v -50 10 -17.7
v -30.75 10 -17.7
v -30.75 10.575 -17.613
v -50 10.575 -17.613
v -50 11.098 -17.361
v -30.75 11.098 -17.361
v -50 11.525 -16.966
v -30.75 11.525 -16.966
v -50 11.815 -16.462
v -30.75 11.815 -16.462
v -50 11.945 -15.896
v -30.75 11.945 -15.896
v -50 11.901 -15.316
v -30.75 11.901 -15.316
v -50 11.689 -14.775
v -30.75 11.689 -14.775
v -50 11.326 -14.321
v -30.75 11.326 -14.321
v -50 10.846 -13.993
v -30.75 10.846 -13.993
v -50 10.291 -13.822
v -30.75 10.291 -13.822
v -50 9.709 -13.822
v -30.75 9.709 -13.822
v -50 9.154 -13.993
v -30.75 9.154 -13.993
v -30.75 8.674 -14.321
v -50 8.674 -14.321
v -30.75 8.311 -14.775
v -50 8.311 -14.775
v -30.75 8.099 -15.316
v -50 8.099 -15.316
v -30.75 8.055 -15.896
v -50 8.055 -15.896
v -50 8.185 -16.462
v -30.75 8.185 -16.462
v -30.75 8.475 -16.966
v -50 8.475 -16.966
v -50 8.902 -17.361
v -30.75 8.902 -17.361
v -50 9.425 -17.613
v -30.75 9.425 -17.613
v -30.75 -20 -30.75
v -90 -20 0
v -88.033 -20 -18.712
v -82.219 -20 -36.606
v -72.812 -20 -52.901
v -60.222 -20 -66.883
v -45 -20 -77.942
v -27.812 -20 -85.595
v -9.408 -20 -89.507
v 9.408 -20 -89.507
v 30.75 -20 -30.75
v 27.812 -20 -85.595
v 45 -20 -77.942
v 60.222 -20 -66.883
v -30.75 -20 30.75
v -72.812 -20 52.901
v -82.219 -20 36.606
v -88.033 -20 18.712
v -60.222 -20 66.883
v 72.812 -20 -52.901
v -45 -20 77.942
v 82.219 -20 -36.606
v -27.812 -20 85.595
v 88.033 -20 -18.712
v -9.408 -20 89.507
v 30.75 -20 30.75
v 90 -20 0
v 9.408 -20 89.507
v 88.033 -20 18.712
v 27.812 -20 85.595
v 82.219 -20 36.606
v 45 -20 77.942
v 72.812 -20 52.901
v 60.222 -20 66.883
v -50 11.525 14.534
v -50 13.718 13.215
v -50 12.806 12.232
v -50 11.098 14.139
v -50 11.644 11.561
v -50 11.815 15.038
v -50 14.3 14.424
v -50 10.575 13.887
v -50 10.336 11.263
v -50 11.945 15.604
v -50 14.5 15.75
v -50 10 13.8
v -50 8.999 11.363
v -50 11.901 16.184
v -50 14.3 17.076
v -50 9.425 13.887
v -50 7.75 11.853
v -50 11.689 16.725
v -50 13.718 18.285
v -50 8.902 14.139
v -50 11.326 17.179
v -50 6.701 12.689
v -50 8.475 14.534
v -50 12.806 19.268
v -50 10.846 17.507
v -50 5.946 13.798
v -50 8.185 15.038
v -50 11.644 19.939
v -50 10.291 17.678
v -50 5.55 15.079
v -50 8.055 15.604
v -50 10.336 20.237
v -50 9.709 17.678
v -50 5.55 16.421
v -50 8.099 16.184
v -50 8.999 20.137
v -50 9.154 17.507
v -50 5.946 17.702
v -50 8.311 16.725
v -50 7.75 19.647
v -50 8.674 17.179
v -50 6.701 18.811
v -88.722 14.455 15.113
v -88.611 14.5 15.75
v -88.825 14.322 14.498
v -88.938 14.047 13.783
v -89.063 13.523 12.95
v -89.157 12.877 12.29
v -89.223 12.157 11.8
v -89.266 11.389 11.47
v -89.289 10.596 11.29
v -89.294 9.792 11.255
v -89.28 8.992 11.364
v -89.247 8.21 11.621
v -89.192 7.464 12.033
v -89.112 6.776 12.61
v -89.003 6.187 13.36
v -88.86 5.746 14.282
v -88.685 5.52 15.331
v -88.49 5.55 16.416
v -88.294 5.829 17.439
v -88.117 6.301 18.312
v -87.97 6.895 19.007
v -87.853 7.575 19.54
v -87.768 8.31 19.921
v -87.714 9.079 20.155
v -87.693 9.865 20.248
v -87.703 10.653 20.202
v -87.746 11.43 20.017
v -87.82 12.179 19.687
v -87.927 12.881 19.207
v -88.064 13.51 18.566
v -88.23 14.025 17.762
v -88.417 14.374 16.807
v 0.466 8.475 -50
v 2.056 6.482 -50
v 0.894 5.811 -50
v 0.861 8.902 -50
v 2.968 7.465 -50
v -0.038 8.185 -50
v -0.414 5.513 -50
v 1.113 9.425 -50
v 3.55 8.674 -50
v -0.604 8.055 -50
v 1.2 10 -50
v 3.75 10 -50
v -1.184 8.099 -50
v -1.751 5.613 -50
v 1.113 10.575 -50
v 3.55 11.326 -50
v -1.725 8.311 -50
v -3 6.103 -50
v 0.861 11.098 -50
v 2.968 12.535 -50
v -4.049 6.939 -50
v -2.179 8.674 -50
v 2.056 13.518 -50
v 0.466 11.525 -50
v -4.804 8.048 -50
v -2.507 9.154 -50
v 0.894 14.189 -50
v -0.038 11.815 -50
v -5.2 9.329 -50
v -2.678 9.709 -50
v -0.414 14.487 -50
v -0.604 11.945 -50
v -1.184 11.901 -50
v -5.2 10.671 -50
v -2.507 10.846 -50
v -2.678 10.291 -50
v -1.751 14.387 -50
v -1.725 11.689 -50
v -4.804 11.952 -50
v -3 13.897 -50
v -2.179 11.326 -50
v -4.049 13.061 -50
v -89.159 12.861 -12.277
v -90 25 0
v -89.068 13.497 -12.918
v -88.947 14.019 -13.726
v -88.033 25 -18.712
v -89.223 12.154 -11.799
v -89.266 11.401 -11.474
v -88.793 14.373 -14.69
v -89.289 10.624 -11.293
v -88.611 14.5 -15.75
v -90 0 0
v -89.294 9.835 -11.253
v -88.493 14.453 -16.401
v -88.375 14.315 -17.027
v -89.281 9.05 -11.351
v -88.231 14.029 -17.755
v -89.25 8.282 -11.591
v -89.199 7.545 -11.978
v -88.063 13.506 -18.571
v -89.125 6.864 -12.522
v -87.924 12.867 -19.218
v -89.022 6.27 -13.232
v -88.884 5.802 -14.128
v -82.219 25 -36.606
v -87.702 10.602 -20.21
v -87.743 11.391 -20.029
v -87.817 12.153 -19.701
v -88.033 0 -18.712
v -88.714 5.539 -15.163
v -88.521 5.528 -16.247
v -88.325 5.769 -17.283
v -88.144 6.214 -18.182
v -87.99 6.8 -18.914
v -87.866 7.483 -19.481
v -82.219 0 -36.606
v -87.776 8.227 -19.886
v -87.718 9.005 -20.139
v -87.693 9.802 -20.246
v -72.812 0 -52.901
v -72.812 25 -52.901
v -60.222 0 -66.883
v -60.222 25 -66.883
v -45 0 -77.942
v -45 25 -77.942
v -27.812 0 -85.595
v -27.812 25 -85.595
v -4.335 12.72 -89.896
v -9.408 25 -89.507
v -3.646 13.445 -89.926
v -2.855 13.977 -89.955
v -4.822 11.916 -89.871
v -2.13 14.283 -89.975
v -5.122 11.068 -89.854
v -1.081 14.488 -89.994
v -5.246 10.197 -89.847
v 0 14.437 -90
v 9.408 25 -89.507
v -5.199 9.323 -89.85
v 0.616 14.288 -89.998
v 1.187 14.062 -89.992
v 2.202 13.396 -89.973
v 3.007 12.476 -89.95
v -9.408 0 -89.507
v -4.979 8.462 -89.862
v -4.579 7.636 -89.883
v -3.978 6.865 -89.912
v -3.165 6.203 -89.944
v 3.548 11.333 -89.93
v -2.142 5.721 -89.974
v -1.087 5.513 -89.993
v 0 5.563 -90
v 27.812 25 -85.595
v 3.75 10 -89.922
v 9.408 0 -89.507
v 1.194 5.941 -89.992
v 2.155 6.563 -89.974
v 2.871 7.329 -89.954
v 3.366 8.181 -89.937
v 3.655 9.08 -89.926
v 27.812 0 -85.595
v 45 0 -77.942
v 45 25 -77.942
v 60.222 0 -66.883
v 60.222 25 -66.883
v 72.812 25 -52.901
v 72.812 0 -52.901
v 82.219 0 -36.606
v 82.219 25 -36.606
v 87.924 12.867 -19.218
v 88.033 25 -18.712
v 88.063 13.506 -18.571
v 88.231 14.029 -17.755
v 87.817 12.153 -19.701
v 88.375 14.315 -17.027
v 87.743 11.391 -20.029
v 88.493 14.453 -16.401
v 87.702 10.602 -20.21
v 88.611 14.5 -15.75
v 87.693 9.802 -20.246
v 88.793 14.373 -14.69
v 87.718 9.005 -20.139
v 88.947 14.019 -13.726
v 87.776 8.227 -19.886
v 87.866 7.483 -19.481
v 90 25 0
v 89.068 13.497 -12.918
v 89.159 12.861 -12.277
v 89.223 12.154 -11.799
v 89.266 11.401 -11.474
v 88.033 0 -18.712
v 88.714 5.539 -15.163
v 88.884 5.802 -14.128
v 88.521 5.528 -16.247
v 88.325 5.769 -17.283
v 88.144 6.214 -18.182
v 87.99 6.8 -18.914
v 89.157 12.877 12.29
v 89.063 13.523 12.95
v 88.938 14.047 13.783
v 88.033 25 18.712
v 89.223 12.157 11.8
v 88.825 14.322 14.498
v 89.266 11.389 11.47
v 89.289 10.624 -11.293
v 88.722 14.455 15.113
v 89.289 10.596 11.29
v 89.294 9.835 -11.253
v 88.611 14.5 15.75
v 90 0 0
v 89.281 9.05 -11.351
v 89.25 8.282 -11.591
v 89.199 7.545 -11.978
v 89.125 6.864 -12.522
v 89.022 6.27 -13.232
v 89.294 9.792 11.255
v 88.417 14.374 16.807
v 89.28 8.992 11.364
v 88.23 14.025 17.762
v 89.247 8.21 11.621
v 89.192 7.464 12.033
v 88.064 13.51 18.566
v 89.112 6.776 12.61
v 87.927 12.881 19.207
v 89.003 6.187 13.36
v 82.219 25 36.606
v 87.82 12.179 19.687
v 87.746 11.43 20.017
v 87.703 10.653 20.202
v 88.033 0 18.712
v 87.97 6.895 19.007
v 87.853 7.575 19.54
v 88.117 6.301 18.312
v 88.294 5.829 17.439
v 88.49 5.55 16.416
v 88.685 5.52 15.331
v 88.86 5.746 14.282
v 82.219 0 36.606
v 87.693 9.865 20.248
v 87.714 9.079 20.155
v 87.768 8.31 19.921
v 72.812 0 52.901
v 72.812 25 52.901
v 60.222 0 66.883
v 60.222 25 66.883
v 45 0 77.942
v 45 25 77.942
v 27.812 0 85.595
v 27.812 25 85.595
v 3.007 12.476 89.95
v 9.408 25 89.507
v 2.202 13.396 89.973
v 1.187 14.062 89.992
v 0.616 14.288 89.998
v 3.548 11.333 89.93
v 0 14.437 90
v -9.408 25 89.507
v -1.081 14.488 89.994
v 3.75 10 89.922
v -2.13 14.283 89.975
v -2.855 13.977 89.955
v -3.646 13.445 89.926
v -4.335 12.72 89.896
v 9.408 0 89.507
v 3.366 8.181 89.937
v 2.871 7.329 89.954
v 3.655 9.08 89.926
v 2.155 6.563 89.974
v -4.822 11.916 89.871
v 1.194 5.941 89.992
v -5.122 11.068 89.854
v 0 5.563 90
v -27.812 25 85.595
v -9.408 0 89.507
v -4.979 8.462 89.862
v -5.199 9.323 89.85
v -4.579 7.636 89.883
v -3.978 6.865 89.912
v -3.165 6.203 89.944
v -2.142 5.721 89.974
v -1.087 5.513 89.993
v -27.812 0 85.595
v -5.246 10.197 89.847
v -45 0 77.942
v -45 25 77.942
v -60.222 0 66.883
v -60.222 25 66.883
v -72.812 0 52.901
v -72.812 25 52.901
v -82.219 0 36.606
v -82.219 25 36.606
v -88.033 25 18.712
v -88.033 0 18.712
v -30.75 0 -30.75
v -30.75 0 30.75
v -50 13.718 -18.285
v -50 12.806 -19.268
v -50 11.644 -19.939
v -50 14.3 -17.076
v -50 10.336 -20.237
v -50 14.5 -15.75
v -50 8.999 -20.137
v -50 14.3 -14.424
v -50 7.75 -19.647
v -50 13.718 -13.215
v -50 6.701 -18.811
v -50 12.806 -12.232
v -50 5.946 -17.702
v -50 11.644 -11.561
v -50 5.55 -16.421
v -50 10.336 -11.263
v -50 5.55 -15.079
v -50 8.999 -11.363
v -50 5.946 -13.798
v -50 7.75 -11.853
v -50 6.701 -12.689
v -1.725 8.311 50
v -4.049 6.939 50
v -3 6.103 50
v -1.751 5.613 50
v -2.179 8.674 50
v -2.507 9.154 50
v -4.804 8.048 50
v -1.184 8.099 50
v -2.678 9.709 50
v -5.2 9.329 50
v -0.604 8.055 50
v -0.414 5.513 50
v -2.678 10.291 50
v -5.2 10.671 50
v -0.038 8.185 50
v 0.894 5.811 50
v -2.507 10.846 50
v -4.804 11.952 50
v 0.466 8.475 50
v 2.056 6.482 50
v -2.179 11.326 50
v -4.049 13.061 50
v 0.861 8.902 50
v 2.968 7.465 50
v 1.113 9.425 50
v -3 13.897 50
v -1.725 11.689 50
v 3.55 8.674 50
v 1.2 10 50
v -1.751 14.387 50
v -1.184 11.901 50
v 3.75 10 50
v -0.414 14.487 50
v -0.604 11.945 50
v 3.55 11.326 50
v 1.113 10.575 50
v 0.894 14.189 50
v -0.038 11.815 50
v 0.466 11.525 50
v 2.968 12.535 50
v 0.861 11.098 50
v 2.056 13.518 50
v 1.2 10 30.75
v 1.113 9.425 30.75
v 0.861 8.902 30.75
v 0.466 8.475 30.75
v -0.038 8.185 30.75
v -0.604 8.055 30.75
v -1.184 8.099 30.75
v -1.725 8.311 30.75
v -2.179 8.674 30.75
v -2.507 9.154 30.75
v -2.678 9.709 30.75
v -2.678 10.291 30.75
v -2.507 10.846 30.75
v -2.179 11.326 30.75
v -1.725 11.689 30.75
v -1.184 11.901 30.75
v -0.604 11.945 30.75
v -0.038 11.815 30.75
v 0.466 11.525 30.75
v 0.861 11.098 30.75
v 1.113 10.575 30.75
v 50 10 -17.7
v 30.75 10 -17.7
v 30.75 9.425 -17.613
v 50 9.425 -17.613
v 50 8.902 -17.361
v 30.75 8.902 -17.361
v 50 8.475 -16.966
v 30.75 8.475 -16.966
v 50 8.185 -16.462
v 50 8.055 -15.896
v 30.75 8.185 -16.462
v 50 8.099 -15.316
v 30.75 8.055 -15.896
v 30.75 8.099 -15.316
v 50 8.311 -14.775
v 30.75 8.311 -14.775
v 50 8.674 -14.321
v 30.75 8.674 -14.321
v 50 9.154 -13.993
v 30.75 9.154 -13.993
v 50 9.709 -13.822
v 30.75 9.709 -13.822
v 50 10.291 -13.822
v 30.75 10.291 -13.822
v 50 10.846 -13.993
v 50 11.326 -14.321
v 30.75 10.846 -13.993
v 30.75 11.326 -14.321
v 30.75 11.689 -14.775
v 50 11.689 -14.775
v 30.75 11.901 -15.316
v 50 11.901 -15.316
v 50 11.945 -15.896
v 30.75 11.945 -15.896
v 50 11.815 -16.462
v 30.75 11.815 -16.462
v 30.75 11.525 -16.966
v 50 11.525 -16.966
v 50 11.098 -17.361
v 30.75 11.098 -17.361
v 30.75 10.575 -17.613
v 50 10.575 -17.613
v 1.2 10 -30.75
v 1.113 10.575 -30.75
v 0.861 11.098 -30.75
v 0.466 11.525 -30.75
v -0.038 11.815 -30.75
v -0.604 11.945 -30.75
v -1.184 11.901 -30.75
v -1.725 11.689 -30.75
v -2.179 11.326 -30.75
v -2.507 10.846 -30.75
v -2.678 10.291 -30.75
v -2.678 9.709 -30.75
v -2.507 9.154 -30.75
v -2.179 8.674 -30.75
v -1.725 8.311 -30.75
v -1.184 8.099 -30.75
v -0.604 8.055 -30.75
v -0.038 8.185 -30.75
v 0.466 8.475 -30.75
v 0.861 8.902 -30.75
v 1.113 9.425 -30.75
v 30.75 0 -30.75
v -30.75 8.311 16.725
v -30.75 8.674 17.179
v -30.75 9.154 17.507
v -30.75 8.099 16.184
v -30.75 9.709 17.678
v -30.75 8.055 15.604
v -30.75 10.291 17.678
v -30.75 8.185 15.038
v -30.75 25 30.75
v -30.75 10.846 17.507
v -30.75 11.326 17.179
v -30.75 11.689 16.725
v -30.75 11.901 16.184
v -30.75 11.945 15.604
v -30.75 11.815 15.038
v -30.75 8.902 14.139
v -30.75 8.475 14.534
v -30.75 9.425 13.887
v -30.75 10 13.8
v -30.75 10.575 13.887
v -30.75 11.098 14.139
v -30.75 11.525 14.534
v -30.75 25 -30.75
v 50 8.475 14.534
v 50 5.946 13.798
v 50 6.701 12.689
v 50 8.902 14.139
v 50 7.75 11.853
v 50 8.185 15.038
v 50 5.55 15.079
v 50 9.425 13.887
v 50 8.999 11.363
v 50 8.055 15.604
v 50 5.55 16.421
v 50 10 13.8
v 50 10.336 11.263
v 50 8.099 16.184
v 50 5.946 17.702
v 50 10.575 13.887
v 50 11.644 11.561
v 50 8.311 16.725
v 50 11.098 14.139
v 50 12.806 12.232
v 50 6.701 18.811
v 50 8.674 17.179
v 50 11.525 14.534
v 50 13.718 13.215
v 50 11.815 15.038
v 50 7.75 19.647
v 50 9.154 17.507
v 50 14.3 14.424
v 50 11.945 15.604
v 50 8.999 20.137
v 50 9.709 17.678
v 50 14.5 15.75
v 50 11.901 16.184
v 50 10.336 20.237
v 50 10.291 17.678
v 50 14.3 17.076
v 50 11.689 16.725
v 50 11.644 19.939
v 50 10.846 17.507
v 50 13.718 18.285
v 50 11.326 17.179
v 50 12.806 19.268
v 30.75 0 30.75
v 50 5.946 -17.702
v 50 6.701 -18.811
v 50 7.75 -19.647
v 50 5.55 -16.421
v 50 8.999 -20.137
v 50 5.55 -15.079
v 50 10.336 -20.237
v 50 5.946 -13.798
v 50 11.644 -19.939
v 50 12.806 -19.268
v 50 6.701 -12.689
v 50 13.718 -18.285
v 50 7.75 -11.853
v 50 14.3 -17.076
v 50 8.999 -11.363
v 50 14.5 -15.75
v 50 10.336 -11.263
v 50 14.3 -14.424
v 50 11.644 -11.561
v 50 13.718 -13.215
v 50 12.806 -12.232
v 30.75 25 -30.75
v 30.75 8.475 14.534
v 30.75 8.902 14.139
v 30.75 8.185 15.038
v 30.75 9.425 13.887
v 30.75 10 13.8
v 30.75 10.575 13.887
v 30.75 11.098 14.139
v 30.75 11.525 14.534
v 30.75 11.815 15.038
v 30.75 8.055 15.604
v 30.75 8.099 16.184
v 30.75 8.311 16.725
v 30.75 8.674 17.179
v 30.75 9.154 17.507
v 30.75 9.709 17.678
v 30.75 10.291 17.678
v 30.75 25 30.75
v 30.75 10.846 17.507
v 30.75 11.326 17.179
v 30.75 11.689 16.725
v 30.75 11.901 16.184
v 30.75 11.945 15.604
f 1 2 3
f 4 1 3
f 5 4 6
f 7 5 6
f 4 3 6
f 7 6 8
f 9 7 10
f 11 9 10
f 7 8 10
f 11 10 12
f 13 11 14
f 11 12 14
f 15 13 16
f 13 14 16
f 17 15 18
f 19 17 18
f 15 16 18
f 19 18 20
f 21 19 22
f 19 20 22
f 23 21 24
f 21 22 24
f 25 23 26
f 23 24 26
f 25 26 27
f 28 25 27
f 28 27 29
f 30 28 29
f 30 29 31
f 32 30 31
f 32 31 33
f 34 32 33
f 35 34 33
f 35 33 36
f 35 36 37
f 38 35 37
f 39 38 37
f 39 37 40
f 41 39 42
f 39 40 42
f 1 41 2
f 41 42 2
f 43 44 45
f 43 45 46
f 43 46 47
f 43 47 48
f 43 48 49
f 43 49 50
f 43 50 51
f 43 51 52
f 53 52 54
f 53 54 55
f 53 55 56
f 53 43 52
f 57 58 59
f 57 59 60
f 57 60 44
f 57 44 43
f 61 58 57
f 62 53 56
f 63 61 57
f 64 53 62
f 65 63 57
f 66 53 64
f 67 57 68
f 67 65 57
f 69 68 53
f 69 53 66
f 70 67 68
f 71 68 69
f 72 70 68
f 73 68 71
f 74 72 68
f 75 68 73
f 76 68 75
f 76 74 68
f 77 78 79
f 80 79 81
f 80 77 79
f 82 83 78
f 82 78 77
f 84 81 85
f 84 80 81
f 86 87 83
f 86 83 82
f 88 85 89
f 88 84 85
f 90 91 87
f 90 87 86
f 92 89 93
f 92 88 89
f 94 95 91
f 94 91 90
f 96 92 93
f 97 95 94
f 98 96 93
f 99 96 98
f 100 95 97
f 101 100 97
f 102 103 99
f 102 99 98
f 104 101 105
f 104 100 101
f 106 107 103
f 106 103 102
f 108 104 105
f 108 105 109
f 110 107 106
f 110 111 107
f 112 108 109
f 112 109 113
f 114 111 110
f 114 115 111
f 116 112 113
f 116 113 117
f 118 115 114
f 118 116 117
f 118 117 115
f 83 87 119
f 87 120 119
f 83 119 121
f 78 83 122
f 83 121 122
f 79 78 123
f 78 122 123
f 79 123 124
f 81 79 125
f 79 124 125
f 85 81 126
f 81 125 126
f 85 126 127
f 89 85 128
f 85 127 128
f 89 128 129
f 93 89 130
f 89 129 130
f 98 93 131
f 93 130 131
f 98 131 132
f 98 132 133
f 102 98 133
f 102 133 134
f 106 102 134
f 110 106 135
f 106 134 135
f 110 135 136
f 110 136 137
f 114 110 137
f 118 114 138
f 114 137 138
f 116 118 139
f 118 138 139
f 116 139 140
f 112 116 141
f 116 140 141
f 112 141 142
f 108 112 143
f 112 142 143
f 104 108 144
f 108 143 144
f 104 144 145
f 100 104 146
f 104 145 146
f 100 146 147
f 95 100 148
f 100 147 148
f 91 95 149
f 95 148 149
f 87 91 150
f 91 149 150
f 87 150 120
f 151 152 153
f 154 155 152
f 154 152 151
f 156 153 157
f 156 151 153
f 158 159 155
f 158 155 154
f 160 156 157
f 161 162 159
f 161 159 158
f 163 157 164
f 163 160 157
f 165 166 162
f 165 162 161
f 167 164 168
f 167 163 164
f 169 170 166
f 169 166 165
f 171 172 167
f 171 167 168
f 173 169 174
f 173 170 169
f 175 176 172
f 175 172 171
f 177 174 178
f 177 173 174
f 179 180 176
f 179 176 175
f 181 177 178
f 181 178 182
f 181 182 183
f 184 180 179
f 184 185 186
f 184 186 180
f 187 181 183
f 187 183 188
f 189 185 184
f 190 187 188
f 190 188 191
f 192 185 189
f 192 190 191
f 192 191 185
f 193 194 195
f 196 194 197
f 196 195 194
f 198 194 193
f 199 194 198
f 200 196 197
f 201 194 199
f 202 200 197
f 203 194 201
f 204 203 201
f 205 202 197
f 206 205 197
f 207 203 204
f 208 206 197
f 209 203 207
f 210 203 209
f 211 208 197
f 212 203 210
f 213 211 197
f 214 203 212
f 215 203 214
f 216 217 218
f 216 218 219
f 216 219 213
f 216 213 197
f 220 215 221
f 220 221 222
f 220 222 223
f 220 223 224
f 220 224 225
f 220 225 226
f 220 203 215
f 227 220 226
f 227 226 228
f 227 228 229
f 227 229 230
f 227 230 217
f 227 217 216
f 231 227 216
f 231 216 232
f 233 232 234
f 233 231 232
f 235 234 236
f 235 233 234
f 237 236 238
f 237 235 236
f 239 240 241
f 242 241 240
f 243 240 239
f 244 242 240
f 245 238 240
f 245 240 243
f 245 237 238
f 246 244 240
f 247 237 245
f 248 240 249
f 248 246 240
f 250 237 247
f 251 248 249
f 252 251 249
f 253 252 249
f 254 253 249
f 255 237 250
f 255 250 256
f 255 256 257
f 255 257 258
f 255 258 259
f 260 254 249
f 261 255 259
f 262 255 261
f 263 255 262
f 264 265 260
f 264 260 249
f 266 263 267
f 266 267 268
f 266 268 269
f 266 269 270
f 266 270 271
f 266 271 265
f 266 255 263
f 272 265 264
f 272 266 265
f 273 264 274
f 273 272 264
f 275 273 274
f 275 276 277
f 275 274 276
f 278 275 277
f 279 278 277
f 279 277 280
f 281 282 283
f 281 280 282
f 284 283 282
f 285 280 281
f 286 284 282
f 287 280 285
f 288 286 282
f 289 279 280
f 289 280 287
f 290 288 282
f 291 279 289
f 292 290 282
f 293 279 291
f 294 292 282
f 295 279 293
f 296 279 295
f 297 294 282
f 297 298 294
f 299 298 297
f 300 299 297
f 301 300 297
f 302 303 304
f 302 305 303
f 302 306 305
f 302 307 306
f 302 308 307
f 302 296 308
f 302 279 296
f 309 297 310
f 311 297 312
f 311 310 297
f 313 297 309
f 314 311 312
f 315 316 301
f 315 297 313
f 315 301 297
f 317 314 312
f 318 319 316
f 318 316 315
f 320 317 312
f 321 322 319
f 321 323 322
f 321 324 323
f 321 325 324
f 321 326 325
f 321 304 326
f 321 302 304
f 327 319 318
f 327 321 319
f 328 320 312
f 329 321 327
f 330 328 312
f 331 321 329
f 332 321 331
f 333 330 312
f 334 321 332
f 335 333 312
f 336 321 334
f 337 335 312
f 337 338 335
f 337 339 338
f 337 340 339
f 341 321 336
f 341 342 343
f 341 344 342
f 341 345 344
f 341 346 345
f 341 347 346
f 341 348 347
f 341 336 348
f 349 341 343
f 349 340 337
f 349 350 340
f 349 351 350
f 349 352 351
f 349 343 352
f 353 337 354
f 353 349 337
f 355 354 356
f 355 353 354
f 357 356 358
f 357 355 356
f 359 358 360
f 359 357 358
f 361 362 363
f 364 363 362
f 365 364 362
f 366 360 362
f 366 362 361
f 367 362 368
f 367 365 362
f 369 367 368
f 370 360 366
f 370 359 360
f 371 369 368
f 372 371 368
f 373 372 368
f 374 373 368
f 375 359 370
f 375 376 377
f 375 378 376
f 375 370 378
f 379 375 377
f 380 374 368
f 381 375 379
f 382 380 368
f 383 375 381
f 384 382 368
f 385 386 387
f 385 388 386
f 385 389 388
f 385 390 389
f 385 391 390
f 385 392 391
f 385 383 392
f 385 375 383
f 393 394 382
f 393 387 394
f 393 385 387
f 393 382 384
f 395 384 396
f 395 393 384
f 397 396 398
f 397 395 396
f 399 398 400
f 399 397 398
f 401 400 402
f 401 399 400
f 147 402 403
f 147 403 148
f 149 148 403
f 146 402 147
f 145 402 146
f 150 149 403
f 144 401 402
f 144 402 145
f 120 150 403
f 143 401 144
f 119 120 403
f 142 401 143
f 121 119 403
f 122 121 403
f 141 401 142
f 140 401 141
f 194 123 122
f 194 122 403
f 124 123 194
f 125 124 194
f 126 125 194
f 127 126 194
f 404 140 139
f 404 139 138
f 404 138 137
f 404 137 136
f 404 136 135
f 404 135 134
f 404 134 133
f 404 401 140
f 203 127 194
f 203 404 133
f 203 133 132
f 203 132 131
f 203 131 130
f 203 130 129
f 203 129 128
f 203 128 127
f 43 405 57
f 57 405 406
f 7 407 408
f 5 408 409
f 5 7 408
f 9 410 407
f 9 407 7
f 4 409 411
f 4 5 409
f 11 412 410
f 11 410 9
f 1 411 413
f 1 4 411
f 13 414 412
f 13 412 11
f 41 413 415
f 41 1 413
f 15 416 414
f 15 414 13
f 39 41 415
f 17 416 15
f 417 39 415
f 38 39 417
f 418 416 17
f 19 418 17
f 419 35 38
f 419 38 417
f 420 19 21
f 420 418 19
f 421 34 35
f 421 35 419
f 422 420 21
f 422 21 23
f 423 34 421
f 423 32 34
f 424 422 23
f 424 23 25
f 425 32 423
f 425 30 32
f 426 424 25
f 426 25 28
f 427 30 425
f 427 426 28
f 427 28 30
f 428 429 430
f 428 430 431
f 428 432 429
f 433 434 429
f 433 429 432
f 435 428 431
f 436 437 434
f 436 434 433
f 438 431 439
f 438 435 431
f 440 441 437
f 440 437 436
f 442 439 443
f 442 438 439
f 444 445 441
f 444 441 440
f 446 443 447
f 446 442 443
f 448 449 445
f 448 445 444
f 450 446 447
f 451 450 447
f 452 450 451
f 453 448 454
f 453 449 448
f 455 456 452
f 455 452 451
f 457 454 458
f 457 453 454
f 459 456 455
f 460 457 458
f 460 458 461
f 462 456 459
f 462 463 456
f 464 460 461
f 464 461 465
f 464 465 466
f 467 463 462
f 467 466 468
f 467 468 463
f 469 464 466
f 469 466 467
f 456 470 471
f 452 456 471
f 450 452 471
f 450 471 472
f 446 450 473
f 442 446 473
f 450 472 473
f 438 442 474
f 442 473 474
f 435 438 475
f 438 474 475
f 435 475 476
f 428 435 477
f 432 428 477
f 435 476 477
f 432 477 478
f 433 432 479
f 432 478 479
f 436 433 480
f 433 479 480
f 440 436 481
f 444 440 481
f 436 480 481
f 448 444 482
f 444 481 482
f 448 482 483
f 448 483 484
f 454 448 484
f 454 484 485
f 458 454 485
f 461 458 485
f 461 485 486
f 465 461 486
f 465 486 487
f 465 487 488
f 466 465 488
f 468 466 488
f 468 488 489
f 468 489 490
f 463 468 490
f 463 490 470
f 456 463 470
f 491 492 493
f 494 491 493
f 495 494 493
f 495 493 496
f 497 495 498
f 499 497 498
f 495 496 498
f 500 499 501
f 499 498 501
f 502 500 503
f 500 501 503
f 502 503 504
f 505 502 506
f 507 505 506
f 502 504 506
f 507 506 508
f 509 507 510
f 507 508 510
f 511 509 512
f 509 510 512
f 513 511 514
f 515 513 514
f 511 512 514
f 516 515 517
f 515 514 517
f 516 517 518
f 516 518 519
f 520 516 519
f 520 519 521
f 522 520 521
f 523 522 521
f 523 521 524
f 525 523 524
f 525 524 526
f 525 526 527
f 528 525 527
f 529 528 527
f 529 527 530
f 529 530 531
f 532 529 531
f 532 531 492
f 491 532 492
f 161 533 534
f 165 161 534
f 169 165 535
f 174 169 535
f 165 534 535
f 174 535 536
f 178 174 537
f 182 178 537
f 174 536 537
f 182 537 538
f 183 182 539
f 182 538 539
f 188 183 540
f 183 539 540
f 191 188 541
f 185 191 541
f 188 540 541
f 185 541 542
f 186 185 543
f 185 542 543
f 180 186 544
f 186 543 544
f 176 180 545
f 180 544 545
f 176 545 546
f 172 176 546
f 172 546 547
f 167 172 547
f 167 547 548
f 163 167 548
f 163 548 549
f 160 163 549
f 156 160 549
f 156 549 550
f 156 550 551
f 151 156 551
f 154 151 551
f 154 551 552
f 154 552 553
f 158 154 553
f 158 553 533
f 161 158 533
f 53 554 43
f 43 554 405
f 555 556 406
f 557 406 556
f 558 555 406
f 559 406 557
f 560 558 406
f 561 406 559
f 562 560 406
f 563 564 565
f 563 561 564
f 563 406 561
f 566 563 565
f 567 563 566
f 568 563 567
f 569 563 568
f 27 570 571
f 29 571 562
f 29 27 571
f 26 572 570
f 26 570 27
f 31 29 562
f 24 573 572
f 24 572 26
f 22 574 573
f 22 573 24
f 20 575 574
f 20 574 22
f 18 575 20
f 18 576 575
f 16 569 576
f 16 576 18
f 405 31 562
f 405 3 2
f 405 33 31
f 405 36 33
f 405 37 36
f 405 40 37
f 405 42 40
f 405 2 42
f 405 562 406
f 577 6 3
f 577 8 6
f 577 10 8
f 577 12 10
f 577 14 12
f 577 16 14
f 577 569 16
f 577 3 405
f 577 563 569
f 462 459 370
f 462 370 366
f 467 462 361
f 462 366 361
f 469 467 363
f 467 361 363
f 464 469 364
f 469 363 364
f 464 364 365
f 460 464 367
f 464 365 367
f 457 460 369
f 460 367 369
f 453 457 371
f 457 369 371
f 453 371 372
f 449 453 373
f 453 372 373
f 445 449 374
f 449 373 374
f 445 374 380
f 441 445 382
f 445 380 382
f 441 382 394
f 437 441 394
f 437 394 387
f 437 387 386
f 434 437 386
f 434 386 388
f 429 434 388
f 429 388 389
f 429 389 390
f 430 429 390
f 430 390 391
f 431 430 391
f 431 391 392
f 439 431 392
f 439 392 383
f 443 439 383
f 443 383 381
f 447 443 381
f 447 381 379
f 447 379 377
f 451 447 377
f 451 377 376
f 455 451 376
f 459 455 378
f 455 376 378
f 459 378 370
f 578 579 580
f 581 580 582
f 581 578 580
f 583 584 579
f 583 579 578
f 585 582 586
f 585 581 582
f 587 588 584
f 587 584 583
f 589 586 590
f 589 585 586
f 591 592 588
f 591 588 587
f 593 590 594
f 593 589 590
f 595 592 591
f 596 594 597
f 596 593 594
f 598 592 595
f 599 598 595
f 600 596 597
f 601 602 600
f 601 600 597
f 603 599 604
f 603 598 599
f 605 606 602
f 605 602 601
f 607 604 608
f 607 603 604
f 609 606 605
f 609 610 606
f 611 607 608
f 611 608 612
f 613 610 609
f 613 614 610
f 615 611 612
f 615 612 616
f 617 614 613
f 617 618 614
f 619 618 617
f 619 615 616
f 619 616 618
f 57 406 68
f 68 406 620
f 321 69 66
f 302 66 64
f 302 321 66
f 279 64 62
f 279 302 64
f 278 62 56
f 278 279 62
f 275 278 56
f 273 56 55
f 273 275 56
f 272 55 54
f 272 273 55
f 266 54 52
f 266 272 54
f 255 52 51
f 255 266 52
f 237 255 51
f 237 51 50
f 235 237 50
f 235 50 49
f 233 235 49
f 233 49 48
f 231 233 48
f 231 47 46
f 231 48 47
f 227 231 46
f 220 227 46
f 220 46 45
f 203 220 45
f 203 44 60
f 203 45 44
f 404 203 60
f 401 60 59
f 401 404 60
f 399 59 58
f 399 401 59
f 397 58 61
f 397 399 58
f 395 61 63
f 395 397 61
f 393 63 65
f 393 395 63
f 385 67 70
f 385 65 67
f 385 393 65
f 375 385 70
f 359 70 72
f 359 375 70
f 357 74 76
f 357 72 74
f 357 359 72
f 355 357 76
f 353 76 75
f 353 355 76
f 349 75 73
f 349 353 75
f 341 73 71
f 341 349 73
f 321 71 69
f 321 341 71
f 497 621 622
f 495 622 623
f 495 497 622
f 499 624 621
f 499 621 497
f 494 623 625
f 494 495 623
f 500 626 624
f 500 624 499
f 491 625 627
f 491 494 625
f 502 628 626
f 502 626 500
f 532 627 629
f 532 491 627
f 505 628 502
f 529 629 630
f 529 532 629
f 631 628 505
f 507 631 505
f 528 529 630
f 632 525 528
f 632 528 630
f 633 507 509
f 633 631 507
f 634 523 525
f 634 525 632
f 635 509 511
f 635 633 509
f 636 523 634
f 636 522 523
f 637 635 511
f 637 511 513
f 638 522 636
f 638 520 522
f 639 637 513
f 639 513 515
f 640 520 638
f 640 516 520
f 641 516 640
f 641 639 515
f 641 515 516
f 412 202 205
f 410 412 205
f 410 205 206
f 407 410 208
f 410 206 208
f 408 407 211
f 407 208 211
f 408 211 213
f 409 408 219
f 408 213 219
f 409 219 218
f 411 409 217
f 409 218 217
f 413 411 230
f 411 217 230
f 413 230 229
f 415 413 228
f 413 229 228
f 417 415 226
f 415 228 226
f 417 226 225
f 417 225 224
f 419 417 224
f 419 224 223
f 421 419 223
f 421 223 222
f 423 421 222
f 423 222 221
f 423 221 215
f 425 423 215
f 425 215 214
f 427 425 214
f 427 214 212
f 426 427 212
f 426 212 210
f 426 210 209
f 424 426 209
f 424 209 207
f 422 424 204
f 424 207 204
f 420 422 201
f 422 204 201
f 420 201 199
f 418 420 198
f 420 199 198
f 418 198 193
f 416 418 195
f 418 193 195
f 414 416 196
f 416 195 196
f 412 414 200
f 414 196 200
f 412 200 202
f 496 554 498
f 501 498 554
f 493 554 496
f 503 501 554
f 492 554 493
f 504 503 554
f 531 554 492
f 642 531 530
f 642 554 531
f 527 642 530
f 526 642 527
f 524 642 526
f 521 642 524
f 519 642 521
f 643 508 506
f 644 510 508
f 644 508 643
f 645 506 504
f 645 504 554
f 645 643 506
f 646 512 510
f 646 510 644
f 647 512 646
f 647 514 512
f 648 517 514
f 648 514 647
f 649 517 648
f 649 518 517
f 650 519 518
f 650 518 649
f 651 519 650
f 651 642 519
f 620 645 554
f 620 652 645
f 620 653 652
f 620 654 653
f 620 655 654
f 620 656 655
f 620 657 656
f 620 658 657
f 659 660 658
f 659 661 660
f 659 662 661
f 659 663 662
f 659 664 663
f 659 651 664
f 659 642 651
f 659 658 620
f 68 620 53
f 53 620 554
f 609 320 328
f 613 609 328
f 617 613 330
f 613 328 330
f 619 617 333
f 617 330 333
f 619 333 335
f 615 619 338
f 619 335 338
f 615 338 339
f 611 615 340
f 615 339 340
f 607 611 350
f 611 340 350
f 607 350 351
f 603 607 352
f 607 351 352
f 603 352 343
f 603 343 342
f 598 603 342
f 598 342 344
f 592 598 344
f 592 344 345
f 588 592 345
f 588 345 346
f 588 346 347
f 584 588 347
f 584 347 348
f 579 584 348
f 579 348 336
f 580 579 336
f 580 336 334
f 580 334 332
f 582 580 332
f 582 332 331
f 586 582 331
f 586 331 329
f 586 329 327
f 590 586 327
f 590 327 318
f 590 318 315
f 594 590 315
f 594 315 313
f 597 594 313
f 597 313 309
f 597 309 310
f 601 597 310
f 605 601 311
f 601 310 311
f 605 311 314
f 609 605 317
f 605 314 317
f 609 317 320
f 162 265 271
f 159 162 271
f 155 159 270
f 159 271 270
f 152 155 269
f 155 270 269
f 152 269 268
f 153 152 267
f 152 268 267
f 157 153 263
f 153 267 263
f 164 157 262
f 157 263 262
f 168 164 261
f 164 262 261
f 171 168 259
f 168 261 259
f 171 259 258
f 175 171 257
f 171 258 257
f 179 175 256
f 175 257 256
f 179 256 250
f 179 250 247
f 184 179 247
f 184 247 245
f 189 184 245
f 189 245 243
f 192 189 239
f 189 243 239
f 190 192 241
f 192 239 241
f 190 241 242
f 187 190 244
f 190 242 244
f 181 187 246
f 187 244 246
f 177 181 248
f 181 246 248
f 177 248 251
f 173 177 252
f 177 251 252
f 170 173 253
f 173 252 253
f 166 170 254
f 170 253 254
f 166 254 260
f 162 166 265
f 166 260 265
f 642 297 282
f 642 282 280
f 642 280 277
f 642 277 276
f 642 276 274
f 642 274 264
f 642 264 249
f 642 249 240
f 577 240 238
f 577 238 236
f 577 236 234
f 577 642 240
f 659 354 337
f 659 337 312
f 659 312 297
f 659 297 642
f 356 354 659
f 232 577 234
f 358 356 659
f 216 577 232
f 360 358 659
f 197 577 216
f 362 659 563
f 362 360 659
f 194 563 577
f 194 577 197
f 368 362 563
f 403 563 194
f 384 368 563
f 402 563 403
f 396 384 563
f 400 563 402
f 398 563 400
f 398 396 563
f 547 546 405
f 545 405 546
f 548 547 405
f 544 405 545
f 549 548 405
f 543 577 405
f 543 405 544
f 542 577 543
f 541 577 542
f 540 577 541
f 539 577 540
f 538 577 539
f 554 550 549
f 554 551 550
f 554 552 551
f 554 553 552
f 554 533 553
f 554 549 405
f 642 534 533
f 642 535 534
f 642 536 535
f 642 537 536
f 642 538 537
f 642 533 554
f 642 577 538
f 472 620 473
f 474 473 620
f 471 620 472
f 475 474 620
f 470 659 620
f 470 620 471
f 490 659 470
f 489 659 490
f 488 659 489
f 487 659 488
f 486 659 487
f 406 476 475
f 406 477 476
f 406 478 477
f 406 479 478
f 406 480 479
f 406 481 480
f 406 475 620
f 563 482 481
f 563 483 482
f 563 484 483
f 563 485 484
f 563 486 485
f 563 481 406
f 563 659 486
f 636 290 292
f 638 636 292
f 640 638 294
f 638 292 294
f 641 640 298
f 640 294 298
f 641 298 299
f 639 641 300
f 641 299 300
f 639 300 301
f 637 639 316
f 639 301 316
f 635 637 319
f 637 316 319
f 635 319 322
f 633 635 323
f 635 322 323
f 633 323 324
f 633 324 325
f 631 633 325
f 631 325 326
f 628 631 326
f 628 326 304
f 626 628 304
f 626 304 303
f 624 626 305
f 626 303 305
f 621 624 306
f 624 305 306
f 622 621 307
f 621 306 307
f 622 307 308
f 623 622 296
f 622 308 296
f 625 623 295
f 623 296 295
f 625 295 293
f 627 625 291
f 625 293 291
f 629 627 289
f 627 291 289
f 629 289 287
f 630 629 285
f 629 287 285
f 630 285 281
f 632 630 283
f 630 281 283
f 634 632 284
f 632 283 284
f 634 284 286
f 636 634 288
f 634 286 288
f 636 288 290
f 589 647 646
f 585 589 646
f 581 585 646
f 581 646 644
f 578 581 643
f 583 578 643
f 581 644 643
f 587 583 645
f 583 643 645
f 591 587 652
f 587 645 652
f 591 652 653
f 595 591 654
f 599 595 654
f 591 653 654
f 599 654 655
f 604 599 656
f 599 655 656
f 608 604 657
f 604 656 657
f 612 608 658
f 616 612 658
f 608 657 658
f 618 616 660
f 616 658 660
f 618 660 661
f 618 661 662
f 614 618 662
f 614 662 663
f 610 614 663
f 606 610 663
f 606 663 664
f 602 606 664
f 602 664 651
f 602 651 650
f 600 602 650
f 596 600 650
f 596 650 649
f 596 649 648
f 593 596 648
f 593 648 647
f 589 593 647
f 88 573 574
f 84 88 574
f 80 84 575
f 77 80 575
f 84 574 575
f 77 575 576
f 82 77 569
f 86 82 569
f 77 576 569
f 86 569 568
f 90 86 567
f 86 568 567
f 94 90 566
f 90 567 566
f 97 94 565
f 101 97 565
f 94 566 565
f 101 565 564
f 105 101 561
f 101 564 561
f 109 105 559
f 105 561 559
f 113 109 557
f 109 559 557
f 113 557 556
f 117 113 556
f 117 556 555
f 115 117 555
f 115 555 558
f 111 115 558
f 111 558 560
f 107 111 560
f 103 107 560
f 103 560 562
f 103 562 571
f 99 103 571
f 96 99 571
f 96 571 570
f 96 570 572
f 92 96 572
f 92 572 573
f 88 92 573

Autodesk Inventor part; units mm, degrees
ref_plane "XZ Plane" through (0, 0, 0) normal (0, 1, 0) x (-1, 0, 0)
sketch "Sketch1" plane through (0, 0, 0) normal (0, 1, 0) x (-1, 0, 0)
  circle A0 centre (0, 0) radius 90
  dimension "d0" = 180
extrude "Extrusion1" add sketch "Sketch1" along normal blind 25
sketch "Sketch2" plane through (0, 25, 0) normal (0, 1, 0) x (1, 0, 0)
  line L0 (-30.75, 30.75) -> (30.75, 30.75)
  line L1 (30.75, 30.75) -> (30.75, -30.75)
  line L2 (30.75, -30.75) -> (-30.75, -30.75)
  line L3 (-30.75, -30.75) -> (-30.75, 30.75)
  point P0 (0, 0)
  dimension "d3" = 61.5
  dimension "d4" = 61.5
  dimension "d5" = 30.75
  dimension "d6" = 30.75
extrude "Extrusion2" cut sketch "Sketch2" against normal blind 25
sketch "Sketch3" plane through (-30.75, 25, 30.75) normal (1, 0, 0) x (0, 0, -1)
  circle A0 centre (46.5, -15) radius 1.95
  circle A1 centre (15, -15) radius 1.95
  line L0 (61.5, -25) -> (0, -25) projected
  line L1 (61.5, 0) -> (61.5, -25) projected
  line L2 (0, 0) -> (0, -25) projected
  point P0 (30.75, -25)
  dimension "d9" = 3.9
  dimension "d10" = 3.9
  dimension "d11" = 10
  dimension "d12" = 10
  dimension "d13" = 15
  dimension "d14" = 15
extrude "Extrusion3" cut sketch "Sketch3" along normal mid plane 300
sketch "Sketch4" plane through (-30.75, 25, -30.75) normal (0, 0, 1) x (1, 0, 0)
  circle A0 centre (30, -15) radius 1.95
  line L0 (61.5, -25) -> (0, -25) projected
  line L1 (0, 0) -> (0, -25) projected
  point P0 (30.75, -25)
  dimension "d17" = 10
  dimension "d18" = 30
  dimension "d19" = 3.9
extrude "Extrusion4" cut sketch "Sketch4" along normal mid plane 300
ref_plane "Work Plane1" through (90, 0, 0) normal (1, 0, 0) x (0, 1, 0)
sketch "Sketch5" plane through (90, 0, 0) normal (1, 0, 0) x (0, 1, 0)
  circle A0 centre (10, -15.75) radius 1.95 projected
  circle A1 centre (10, -15.75) radius 4.5
  circle A2 centre (10, 15.75) radius 1.95 projected
  circle A3 centre (10, 15.75) radius 4.5
  point P0 (0, 0)
  dimension "d23" = 9
  dimension "d24" = 9
extrude "Extrusion5" cut sketch "Sketch5" against normal blind 40 contours A0 | A1 | A2 | A3
mirror "Mirror1" about plane through (0, 0, 0) normal (1, 0, 0) of "Extrusion5"
ref_plane "Work Plane2" through (0, 0, 90) normal (0, 0, 1) x (1, 0, 0)
sketch "Sketch6" plane through (0, 0, 90) normal (0, 0, 1) x (1, 0, 0)
  circle A0 centre (-0.75, 10) radius 1.95 projected
  circle A1 centre (-0.75, 10) radius 4.5
  point P0 (0, 0)
  dimension "d28" = 9
extrude "Extrusion6" cut sketch "Sketch6" against normal blind 40 contours A0 | A1
mirror "Mirror2" about plane through (0, 0, 0) normal (0, 0, 1) of "Extrusion6"
sketch "Sketch7" plane through (0, 0, 0) normal (0, -1, 0) x (1, 0, 0)
  circle A0 centre (0, 0) radius 90
  line L0 (-30.75, 30.75) -> (30.75, 30.75) projected
  line L1 (-30.75, 30.75) -> (30.75, 30.75)
  line L2 (30.75, 30.75) -> (30.75, -30.75)
  line L3 (30.75, -30.75) -> (-30.75, -30.75)
  line L4 (-30.75, -30.75) -> (-30.75, 30.75)
extrude "Extrusion7" add sketch "Sketch7" along normal blind 20
sketch "Sketch8" plane through (0, 25, 0) normal (0, 1, 0) x (1, 0, 0)
  line L0 (37.3786, -36.9077) -> (37.3786, 35.2103) construction
  line L1 (37.3786, 35.2103) -> (75.2405, 35.2103) construction
  line L2 (75.2405, 35.2103) -> (75.2405, -36.9077) construction
  line L3 (75.2405, -36.9077) -> (37.3786, -36.9077) construction
  point P0 (0, 0)
properties part number "Base_V2a"
